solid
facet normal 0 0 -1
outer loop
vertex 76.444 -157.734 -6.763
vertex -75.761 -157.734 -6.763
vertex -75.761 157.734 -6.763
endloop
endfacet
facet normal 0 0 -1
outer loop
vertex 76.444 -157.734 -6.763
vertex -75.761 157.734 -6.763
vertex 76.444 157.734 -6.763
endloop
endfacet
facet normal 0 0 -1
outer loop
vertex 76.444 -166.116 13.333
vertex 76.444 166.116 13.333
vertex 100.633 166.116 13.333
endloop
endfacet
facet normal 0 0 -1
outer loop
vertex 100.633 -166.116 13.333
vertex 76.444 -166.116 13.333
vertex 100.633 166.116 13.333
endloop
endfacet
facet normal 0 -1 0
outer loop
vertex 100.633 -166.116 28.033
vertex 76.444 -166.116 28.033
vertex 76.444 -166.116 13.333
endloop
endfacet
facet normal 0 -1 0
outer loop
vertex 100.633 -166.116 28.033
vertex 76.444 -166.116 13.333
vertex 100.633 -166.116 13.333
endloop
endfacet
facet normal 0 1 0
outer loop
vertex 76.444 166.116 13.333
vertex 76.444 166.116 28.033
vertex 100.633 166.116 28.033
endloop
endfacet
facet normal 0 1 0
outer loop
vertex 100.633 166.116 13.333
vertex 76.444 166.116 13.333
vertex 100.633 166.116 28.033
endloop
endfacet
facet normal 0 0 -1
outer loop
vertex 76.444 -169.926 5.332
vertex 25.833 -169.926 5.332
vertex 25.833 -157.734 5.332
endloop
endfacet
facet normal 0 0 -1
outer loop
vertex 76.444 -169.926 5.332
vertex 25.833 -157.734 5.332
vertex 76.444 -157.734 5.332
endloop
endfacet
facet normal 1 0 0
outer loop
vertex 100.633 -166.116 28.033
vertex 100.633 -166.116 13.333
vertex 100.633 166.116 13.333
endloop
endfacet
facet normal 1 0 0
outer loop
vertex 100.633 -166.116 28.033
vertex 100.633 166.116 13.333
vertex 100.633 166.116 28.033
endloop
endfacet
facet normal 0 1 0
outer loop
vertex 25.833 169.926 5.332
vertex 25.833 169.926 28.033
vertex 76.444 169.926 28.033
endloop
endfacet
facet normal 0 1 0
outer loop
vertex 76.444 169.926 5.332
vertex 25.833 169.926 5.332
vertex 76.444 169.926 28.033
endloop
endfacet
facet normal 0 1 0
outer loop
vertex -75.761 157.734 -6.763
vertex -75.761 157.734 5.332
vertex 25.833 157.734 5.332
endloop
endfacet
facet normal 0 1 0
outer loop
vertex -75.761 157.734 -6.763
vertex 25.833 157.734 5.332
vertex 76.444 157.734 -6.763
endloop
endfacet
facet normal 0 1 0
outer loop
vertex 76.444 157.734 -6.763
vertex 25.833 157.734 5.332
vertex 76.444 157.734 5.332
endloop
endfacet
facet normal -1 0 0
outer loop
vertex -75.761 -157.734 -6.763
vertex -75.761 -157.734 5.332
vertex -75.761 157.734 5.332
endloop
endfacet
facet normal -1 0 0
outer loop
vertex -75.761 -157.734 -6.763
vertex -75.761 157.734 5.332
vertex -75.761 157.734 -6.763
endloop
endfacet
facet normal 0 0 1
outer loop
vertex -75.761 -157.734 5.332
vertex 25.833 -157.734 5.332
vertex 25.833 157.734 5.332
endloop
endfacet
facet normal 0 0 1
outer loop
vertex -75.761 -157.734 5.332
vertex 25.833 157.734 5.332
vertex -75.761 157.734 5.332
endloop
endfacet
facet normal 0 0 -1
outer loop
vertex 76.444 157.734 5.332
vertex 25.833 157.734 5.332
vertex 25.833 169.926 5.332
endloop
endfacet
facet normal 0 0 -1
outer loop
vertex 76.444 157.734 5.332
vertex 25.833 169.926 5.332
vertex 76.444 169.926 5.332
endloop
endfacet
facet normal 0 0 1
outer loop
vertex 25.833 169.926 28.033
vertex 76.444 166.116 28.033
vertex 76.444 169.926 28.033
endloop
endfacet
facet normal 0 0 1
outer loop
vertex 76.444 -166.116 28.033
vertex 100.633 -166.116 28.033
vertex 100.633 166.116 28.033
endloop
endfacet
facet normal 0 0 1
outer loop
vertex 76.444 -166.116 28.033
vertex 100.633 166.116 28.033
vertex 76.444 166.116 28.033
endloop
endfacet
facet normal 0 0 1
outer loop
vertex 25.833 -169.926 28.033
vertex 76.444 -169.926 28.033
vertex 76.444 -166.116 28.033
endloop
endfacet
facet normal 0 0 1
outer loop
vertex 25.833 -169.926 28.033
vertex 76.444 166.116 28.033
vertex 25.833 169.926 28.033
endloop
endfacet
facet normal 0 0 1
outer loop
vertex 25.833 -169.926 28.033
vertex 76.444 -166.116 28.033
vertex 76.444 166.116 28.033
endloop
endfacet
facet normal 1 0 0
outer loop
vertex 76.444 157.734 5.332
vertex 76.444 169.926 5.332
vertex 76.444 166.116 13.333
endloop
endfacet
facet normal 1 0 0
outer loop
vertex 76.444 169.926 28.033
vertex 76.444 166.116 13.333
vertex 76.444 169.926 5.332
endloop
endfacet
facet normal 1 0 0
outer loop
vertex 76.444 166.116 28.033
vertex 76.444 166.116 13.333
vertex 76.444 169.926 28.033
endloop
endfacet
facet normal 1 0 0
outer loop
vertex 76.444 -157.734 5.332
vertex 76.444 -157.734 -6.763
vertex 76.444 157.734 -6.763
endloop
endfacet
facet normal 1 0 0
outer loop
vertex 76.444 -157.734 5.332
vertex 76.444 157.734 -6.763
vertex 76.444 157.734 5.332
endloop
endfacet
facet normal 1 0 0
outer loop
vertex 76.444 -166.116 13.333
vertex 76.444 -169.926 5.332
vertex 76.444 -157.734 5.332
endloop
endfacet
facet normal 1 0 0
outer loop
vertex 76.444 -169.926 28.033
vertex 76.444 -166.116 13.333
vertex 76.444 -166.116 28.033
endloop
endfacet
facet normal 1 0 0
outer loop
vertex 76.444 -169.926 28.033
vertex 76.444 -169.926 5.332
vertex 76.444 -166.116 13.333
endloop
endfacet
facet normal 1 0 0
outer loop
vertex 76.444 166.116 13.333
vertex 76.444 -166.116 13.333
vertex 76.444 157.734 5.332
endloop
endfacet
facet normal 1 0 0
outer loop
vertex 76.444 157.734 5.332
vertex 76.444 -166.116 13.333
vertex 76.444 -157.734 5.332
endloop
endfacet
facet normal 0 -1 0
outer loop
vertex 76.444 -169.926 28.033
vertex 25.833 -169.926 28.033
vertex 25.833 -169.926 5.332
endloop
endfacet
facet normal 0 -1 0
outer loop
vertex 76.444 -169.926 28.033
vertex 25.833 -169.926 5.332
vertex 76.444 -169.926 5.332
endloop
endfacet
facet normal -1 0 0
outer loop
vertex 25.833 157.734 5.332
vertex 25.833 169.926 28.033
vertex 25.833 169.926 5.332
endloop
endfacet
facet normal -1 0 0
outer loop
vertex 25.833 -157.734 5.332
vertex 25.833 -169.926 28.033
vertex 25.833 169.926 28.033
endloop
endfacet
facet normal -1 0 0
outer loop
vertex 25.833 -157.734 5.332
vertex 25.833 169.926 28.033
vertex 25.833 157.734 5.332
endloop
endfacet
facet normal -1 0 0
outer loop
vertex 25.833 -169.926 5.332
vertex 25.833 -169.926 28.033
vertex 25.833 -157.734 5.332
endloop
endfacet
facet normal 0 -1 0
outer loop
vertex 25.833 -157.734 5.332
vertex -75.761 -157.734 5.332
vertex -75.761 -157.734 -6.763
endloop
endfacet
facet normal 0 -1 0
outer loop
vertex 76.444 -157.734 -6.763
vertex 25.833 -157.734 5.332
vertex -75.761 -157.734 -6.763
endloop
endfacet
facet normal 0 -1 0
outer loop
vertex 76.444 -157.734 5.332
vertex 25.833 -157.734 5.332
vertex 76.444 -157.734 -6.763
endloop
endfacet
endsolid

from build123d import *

# Parameters (mm, degrees)
F1_DEPTH  = 42.926
F2_R      = 15.9122903495
F3_DEPTH  = 217.932
F7_DEPTH  = 169.926
F9_DEPTH  = 157.734
F10_W     = 24.1890698671
F10_H     = 14.7000979632
F11_DEPTH = 166.116


with BuildPart() as f1:
    # F0 (on Front) → F1 (new body)
    with BuildSketch(Plane.XZ):
        Polygon((-3.4105652012, 57.7952452004), (-72.7279856801, 57.7952452004), (-73.0966925621, 3.0418548267), (-3.4105652012, 3.0418548267), align=None)
    extrude(amount=F1_DEPTH)


with BuildPart() as f3:
    # F2 (on Front) → F3 (new body)
    with BuildSketch(Plane.XZ):
        with Locations((-37.1474996209, -45.6278249621)):
            Circle(F2_R)
    extrude(amount=F3_DEPTH)


with BuildPart() as f7:
    # F6 (on face) → F7 (new body, symmetric)
    with BuildSketch(Plane.XZ):
        Polygon((76.4440670609, 28.0330423266), (25.8330944926, 28.0330423266), (25.8330944926, 5.3316229023), (76.4440670609, 5.3316229023), (76.4440670609, 13.3329443634), align=None)
    extrude(amount=F7_DEPTH, both=True)

    # F8 (on face) → F9 (join, symmetric)
    with BuildSketch(Plane.XZ):
        Polygon((76.4440670609, 5.3316229023), (25.8330944926, 5.3316229023), (-75.7609978318, 5.3316229023), (-75.7609978318, -6.763396319), (76.4440670609, -6.763396319), align=None)
    extrude(amount=F9_DEPTH, both=True)

    # F10 (on face) → F11 (join, symmetric)
    with BuildSketch(Plane.XZ):
        with Locations((88.5386019945, 20.682993345)):
            Rectangle(F10_W, F10_H)
    extrude(amount=F11_DEPTH, both=True)


solid = f7.part
